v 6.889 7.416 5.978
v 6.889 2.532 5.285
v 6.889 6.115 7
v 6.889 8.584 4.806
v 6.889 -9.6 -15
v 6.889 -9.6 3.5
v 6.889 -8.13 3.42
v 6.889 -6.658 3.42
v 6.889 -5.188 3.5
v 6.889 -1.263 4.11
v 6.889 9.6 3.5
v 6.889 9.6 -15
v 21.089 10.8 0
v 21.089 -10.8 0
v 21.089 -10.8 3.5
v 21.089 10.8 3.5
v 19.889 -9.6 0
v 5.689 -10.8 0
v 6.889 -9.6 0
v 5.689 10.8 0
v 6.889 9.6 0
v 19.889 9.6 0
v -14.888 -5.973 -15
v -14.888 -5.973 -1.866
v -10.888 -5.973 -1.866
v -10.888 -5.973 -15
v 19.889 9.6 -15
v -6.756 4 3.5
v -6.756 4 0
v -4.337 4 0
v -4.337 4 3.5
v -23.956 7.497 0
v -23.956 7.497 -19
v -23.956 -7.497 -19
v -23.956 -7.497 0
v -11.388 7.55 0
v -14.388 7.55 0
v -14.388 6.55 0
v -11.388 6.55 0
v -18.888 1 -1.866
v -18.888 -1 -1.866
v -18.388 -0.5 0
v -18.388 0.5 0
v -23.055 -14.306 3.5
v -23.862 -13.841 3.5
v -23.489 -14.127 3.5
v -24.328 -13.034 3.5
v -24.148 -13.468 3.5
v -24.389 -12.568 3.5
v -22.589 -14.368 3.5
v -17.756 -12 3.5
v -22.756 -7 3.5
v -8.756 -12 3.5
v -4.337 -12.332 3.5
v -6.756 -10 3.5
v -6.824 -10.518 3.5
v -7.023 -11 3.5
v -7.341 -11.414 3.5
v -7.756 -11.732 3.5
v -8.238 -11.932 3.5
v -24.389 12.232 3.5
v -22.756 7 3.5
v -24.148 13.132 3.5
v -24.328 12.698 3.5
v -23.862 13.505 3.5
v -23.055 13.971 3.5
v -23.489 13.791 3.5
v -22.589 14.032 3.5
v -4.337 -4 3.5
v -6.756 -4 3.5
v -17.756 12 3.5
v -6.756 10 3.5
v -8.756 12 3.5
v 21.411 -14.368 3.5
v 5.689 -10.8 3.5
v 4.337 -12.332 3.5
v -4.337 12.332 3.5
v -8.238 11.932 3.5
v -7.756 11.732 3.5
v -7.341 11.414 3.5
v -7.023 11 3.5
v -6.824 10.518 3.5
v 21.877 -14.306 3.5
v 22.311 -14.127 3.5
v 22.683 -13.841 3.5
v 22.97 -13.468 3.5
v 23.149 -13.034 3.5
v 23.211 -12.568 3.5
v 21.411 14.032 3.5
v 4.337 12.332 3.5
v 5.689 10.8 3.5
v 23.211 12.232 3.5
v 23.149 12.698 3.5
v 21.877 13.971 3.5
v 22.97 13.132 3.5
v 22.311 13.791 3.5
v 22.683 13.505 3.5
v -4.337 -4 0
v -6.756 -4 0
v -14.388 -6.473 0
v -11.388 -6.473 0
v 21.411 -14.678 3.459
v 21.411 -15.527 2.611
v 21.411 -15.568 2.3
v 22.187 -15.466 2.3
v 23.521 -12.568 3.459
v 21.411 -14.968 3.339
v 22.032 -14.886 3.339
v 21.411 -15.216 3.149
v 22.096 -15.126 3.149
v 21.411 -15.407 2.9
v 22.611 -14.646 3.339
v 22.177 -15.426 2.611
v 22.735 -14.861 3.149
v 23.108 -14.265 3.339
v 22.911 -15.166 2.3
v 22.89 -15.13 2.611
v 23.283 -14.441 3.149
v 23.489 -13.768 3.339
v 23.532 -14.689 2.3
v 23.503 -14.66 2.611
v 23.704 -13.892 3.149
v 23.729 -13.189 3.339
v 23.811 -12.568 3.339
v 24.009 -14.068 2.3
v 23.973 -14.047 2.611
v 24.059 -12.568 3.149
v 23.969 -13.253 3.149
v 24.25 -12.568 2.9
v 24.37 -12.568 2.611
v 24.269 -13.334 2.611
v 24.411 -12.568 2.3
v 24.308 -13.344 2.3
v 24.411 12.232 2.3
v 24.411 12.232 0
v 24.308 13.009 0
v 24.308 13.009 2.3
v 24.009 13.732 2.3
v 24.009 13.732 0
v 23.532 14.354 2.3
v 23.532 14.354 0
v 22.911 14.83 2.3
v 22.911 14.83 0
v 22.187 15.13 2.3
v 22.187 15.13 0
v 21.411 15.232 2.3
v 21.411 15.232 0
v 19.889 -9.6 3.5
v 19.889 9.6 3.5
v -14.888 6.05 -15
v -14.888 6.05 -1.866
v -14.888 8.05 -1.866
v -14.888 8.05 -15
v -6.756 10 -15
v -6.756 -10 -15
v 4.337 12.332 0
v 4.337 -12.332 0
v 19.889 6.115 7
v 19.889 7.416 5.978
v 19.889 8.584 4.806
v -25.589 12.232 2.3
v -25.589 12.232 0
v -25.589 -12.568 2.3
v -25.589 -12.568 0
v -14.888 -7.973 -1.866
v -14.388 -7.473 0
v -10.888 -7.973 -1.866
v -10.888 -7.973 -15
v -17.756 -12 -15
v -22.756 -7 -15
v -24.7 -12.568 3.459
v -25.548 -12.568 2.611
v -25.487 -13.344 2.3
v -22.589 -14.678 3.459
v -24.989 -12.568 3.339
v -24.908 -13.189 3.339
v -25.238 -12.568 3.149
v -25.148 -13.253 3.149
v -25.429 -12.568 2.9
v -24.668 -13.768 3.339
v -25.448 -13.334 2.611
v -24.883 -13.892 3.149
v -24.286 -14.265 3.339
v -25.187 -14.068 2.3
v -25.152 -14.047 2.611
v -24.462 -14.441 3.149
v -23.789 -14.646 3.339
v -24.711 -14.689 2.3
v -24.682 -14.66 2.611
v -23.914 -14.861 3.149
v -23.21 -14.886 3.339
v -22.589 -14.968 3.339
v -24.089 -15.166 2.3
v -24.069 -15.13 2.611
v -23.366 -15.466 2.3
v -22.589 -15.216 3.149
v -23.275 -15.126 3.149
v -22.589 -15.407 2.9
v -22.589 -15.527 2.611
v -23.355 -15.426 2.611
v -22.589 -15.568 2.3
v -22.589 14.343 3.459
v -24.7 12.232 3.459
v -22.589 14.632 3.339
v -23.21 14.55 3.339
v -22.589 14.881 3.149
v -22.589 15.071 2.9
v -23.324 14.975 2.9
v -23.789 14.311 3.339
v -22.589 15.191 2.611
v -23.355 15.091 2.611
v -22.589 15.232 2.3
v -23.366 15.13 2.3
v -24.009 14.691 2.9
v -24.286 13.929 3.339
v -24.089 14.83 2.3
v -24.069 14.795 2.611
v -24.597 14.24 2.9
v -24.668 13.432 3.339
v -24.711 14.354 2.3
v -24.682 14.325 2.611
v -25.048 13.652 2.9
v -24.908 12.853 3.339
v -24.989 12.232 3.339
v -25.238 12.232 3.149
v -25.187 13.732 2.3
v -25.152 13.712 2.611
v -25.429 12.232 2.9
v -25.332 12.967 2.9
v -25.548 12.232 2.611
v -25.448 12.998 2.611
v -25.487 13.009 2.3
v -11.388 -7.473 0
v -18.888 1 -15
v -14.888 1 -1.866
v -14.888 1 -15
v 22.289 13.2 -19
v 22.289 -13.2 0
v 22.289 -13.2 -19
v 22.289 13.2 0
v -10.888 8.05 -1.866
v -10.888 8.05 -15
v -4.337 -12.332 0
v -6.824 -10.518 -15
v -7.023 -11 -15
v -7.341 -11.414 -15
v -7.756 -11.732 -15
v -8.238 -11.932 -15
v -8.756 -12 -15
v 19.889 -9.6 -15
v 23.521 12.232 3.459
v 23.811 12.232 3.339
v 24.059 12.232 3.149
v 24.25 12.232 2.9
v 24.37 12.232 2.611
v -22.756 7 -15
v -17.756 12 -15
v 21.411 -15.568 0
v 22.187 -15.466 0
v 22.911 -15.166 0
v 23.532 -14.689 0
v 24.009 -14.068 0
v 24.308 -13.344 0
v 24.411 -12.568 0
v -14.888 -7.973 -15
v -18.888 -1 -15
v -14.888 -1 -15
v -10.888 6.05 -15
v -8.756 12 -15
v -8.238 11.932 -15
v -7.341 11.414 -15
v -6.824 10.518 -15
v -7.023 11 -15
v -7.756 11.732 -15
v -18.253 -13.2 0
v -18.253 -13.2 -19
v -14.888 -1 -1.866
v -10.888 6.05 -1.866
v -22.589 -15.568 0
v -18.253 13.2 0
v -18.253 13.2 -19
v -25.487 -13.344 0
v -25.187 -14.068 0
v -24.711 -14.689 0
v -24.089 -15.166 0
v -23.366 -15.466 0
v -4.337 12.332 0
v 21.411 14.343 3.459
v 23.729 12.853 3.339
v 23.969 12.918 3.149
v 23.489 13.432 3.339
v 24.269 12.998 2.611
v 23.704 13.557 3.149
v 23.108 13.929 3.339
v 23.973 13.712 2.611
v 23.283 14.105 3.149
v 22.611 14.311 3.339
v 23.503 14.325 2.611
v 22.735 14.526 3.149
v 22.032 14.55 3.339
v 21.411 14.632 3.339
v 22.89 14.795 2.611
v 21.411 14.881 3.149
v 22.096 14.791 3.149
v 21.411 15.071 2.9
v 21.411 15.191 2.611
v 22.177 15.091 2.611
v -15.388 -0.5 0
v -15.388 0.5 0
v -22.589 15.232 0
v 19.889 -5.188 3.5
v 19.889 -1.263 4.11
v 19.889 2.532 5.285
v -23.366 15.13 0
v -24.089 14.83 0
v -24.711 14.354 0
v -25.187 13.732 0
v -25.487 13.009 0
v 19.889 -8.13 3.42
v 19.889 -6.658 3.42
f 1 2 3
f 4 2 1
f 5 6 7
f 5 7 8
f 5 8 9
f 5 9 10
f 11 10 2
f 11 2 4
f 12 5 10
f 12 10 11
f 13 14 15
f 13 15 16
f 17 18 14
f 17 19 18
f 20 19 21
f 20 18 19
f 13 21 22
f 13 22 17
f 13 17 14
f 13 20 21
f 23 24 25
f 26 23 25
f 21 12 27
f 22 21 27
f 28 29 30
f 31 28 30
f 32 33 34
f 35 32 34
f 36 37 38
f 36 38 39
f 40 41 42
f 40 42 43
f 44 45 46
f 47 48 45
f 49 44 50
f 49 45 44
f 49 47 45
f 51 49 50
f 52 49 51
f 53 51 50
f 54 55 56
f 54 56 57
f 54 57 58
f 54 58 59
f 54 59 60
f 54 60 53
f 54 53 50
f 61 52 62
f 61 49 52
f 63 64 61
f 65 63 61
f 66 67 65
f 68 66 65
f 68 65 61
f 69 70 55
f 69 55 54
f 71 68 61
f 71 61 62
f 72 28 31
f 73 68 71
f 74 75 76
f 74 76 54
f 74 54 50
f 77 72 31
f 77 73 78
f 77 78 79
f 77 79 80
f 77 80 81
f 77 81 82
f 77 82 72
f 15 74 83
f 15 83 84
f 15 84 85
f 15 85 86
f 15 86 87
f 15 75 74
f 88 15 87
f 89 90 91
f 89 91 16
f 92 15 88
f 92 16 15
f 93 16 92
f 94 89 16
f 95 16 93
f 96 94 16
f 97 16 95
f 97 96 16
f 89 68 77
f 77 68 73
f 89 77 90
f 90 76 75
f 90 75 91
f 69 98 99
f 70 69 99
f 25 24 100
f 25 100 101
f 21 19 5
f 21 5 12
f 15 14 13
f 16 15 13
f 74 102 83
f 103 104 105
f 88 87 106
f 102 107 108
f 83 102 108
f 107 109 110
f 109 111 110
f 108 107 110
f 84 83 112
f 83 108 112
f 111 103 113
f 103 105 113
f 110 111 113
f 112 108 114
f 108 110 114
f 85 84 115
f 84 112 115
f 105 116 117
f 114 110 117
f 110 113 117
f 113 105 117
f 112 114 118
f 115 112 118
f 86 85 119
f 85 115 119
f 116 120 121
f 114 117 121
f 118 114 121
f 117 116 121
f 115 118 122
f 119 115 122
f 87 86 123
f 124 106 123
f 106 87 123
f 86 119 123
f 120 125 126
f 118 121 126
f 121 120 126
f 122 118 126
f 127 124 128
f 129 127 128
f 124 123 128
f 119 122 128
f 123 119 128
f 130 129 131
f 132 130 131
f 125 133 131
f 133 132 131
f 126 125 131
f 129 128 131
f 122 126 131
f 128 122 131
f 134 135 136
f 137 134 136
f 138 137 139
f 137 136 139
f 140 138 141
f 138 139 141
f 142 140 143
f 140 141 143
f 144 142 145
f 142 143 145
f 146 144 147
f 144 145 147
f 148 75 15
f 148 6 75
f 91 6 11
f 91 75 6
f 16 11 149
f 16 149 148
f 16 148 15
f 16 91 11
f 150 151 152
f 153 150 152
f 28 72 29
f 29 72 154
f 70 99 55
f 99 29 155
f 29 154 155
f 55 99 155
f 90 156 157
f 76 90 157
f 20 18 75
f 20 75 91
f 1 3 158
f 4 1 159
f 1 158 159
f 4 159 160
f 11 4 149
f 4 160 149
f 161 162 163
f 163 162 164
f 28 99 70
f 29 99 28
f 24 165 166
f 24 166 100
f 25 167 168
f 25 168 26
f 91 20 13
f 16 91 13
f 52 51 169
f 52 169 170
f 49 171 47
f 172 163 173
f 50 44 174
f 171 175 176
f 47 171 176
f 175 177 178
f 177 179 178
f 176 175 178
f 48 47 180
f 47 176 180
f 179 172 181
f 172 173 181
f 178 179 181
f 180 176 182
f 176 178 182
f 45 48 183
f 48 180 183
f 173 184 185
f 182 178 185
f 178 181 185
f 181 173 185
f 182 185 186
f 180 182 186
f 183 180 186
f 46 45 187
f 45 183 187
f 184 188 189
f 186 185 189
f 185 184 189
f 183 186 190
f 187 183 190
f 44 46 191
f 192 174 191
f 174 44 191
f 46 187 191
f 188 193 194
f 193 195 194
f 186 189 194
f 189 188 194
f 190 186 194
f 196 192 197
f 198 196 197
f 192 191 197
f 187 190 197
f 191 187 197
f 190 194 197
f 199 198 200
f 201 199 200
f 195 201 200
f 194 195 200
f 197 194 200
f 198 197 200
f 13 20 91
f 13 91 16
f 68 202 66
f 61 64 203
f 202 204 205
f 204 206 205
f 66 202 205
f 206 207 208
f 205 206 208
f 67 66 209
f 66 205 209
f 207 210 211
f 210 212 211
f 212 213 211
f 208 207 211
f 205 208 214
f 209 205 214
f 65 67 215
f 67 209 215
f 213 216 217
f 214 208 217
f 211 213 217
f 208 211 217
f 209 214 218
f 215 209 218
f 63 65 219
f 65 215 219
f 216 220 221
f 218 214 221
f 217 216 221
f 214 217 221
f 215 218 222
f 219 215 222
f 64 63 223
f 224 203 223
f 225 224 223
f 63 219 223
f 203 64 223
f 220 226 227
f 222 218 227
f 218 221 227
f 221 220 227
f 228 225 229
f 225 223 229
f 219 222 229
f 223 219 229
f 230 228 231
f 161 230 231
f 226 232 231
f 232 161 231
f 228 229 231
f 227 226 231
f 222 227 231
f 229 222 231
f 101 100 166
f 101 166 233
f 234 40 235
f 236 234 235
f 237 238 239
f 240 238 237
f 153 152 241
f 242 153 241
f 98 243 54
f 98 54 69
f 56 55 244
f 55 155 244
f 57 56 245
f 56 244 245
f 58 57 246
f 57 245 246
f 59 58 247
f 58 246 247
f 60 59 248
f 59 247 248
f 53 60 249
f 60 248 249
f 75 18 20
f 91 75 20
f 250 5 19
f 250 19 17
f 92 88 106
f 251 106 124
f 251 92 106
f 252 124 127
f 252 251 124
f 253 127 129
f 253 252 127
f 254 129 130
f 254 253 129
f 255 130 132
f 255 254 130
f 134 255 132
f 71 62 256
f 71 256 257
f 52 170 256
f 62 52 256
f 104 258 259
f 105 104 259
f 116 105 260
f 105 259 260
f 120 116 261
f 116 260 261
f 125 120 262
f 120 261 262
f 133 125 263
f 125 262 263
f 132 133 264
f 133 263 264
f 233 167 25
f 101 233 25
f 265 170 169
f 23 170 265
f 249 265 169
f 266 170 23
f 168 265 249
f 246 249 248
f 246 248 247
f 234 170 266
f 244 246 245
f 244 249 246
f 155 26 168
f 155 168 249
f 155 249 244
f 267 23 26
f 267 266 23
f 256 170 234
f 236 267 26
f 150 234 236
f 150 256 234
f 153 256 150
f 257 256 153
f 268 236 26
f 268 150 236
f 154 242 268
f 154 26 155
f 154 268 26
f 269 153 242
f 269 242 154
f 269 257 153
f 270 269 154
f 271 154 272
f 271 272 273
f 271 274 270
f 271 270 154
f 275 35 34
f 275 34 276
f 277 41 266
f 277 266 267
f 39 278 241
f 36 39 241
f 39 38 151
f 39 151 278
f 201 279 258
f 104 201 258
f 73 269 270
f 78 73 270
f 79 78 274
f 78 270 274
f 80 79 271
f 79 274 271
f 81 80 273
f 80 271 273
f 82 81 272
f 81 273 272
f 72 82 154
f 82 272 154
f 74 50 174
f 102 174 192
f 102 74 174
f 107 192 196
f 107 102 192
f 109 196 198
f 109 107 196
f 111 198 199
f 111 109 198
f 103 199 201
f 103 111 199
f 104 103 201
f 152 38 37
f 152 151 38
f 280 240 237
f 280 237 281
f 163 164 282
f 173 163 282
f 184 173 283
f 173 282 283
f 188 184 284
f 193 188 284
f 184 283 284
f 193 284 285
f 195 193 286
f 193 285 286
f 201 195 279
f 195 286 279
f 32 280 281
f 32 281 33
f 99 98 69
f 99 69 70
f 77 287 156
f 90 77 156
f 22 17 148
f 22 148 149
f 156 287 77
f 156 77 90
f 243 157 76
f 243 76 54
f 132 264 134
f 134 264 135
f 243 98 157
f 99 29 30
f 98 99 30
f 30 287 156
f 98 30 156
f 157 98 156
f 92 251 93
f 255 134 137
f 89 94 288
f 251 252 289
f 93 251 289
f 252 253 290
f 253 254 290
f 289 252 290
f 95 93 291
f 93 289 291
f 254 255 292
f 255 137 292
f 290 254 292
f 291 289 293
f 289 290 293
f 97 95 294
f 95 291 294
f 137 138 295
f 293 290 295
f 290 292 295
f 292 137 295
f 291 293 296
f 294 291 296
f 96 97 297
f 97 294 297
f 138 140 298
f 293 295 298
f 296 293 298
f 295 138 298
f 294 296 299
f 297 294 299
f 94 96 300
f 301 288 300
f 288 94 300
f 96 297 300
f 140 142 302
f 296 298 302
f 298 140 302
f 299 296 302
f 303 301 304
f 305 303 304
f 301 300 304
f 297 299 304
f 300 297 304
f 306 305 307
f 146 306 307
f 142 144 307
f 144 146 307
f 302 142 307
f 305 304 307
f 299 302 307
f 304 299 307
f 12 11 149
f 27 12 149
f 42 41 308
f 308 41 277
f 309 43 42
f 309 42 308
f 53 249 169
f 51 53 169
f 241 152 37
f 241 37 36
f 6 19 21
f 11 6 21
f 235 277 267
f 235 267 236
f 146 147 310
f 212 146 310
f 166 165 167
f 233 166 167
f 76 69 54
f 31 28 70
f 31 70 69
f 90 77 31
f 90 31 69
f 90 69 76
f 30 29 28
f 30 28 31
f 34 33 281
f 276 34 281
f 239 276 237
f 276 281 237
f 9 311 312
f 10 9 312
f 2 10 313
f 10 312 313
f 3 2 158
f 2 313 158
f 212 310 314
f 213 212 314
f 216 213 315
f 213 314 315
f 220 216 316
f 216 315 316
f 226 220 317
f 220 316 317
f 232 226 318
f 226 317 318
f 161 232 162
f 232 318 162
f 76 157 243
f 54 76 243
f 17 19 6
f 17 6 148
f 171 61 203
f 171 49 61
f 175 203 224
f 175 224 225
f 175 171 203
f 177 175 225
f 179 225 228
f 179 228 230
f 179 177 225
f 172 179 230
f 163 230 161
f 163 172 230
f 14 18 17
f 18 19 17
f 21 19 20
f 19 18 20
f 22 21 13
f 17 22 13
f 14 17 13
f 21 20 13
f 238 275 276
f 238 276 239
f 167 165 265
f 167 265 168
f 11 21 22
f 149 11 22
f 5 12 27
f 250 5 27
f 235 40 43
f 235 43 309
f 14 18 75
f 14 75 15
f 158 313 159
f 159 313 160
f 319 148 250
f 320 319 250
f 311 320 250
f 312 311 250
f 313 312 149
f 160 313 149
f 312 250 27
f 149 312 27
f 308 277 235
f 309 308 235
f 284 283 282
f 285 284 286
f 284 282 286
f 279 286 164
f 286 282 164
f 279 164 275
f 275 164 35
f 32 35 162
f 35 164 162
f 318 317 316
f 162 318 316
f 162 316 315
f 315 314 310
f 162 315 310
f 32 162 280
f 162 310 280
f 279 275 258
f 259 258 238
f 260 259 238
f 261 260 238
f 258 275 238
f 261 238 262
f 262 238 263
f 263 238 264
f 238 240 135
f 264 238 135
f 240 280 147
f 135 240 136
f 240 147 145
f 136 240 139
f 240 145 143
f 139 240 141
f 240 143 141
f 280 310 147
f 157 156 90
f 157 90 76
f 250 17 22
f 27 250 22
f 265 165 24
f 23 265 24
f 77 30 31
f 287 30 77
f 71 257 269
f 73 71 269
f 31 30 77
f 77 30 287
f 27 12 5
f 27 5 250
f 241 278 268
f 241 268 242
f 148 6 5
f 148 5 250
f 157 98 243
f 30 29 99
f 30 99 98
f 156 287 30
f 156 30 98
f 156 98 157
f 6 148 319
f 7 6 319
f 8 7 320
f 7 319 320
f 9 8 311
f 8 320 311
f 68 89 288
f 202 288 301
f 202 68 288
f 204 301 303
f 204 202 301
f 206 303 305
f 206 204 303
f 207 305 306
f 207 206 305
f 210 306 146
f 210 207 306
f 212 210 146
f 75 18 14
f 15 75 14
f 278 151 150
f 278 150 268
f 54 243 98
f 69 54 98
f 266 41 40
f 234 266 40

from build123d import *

# Parameters (mm, degrees)
F0_W        = 15.4
F0_H        = 21.6
F1_DEPTH    = 3.5
F0_W_2      = 4
F0_H_2      = 2
F0_W_3      = 13
F0_H_3      = 19.2
F0_W_4      = 2.418700546
F0_H_4      = 8
F2_DEPTH    = 19
F3_DEPTH    = 15
F4_C1_SIZE2 = 0.5
F4_C1_SIZE  = 1.8660254038
F4_C2_SIZE2 = 0.5
F4_C2_SIZE  = 1.8660254038
F4_C3_SIZE2 = 1.8660254038
F4_C3_SIZE  = 0.5
F4_C4_SIZE2 = 1.8660254038
F4_C4_SIZE  = 0.5
F5_SIZE2    = 1.8660254038
F5_SIZE     = 0.5
F6_SIZE2    = 1.8660254038
F6_SIZE     = 0.5
F7_DEPTH    = 3.5
F8_DEPTH    = 22
F10_DEPTH   = 25
F11_R       = 1.2


with BuildPart() as f1:
    # F0 (on Top) → F1 (new body)
    with BuildSketch(Plane.XY):
        with BuildLine():
            Line((21.4106866419, 15.232257545), (-22.5893133581, 15.232257545))
            ThreePointArc((-22.5893133581, 15.232257545), (-24.7106337016, 14.3535778886), (-25.5893133581, 12.232257545))
            Line((-25.5893133581, 12.232257545), (-25.5893133581, -12.567742455))
            ThreePointArc((-25.5893133581, -12.567742455), (-24.7106337016, -14.6890627986), (-22.5893133581, -15.567742455))
            Line((-22.5893133581, -15.567742455), (21.4106866419, -15.567742455))
            ThreePointArc((21.4106866419, -15.567742455), (23.5320069855, -14.6890627986), (24.4106866419, -12.567742455))
            Line((24.4106866419, -12.567742455), (24.4106866419, 12.232257545))
            ThreePointArc((24.4106866419, 12.232257545), (23.5320069855, 14.3535778886), (21.4106866419, 15.232257545))
        make_face()
        Polygon((-18.2525572471, 13.2), (-8.7555009723, 13.2), (22.2888856925, 13.2), (22.2888856925, -13.2), (-8.7555009723, -13.2), (-18.2525572471, -13.2), (-23.9555009723, -7.4970562748), (-23.9555009723, 7.4970562748), align=None, mode=Mode.SUBTRACT)
        Polygon((22.2888856925, 13.2), (-8.7555009723, 13.2), (-18.2525572471, 13.2), (-23.9555009723, 7.4970562748), (-23.9555009723, -7.4970562748), (-18.2525572471, -13.2), (-8.7555009723, -13.2), (22.2888856925, -13.2), align=None)
        with BuildLine():
            Line((-4.3368004262, 4), (-4.3368004262, 12.3322419822))
            Line((-4.3368004262, 12.3322419822), (4.3368004262, 12.3322419822))
            Line((4.3368004262, 12.3322419822), (4.3368004262, -12.3322419822))
            Line((4.3368004262, -12.3322419822), (-4.3368004262, -12.3322419822))
            Line((-4.3368004262, -12.3322419822), (-4.3368004262, -4))
            Line((-4.3368004262, -4), (-6.7555009723, -4))
            Line((-6.7555009723, -4), (-6.7555009723, -10))
            ThreePointArc((-6.7555009723, -10), (-7.3412874099, -11.4142135624), (-8.7555009723, -12))
            Line((-8.7555009723, -12), (-17.7555009723, -12))
            Line((-17.7555009723, -12), (-22.7555009723, -7))
            Line((-22.7555009723, -7), (-22.7555009723, 7))
            Line((-22.7555009723, 7), (-17.7555009723, 12))
            Line((-17.7555009723, 12), (-8.7555009723, 12))
            ThreePointArc((-8.7555009723, 12), (-7.3412874099, 11.4142135624), (-6.7555009723, 10))
            Line((-6.7555009723, 10), (-6.7555009723, 4))
            Line((-6.7555009723, 4), (-4.3368004262, 4))
        make_face(mode=Mode.SUBTRACT)
        with Locations((13.3888856925, 0)):
            Rectangle(F0_W, F0_H, mode=Mode.SUBTRACT)
    extrude(amount=F1_DEPTH)

    # F0 (on Top) → F2 (join)
    with BuildSketch(Plane.XY):
        Polygon((22.2888856925, 13.2), (-8.7555009723, 13.2), (-18.2525572471, 13.2), (-23.9555009723, 7.4970562748), (-23.9555009723, -7.4970562748), (-18.2525572471, -13.2), (-8.7555009723, -13.2), (22.2888856925, -13.2), align=None)
        with BuildLine():
            Line((-4.3368004262, 4), (-4.3368004262, 12.3322419822))
            Line((-4.3368004262, 12.3322419822), (4.3368004262, 12.3322419822))
            Line((4.3368004262, 12.3322419822), (4.3368004262, -12.3322419822))
            Line((4.3368004262, -12.3322419822), (-4.3368004262, -12.3322419822))
            Line((-4.3368004262, -12.3322419822), (-4.3368004262, -4))
            Line((-4.3368004262, -4), (-6.7555009723, -4))
            Line((-6.7555009723, -4), (-6.7555009723, -10))
            ThreePointArc((-6.7555009723, -10), (-7.3412874099, -11.4142135624), (-8.7555009723, -12))
            Line((-8.7555009723, -12), (-17.7555009723, -12))
            Line((-17.7555009723, -12), (-22.7555009723, -7))
            Line((-22.7555009723, -7), (-22.7555009723, 7))
            Line((-22.7555009723, 7), (-17.7555009723, 12))
            Line((-17.7555009723, 12), (-8.7555009723, 12))
            ThreePointArc((-8.7555009723, 12), (-7.3412874099, 11.4142135624), (-6.7555009723, 10))
            Line((-6.7555009723, 10), (-6.7555009723, 4))
            Line((-6.7555009723, 4), (-4.3368004262, 4))
        make_face(mode=Mode.SUBTRACT)
        with Locations((13.3888856925, 0)):
            Rectangle(F0_W, F0_H, mode=Mode.SUBTRACT)
        with BuildLine():
            Line((-6.7555009723, -4), (-6.7555009723, 4))
            Line((-6.7555009723, 4), (-6.7555009723, 10))
            ThreePointArc((-6.7555009723, 10), (-7.3412874099, 11.4142135624), (-8.7555009723, 12))
            Line((-8.7555009723, 12), (-17.7555009723, 12))
            Line((-17.7555009723, 12), (-22.7555009723, 7))
            Line((-22.7555009723, 7), (-22.7555009723, -7))
            Line((-22.7555009723, -7), (-17.7555009723, -12))
            Line((-17.7555009723, -12), (-8.7555009723, -12))
            ThreePointArc((-8.7555009723, -12), (-7.3412874099, -11.4142135624), (-6.7555009723, -10))
            Line((-6.7555009723, -10), (-6.7555009723, -4))
        make_face()
        with Locations((-12.8875139207, -6.9733052514)):
            Rectangle(F0_W_2, F0_H_2, mode=Mode.SUBTRACT)
        with Locations((-16.8875139207, 0)):
            Rectangle(F0_W_2, F0_H_2, mode=Mode.SUBTRACT)
        with Locations((-12.8875139207, 7.0500936662)):
            Rectangle(F0_W_2, F0_H_2, mode=Mode.SUBTRACT)
        with Locations((13.3888856925, 0)):
            Rectangle(F0_W, F0_H)
        with Locations((13.3888856925, 0)):
            Rectangle(F0_W_3, F0_H_3, mode=Mode.SUBTRACT)
        with Locations((13.3888856925, 0)):
            Rectangle(F0_W_3, F0_H_3)
        Polygon((4.3368004262, 12.3322419822), (-4.3368004262, 12.3322419822), (-4.3368004262, 4), (-4.3368004262, -4), (-4.3368004262, -12.3322419822), (4.3368004262, -12.3322419822), align=None)
        with Locations((-5.5461506993, 0)):
            Rectangle(F0_W_4, F0_H_4)
        with Locations((-12.8875139207, -6.9733052514)):
            Rectangle(F0_W_2, F0_H_2)
        with Locations((-16.8875139207, 0)):
            Rectangle(F0_W_2, F0_H_2)
        with Locations((-12.8875139207, 7.0500936662)):
            Rectangle(F0_W_2, F0_H_2)
    extrude(amount=-F2_DEPTH)

    # F0 (on Top) → F3 (cut)
    with BuildSketch(Plane.XY):
        with BuildLine():
            Line((-6.7555009723, -4), (-6.7555009723, 4))
            Line((-6.7555009723, 4), (-6.7555009723, 10))
            ThreePointArc((-6.7555009723, 10), (-7.3412874099, 11.4142135624), (-8.7555009723, 12))
            Line((-8.7555009723, 12), (-17.7555009723, 12))
            Line((-17.7555009723, 12), (-22.7555009723, 7))
            Line((-22.7555009723, 7), (-22.7555009723, -7))
            Line((-22.7555009723, -7), (-17.7555009723, -12))
            Line((-17.7555009723, -12), (-8.7555009723, -12))
            ThreePointArc((-8.7555009723, -12), (-7.3412874099, -11.4142135624), (-6.7555009723, -10))
            Line((-6.7555009723, -10), (-6.7555009723, -4))
        make_face()
        with Locations((-12.8875139207, -6.9733052514)):
            Rectangle(F0_W_2, F0_H_2, mode=Mode.SUBTRACT)
        with Locations((-16.8875139207, 0)):
            Rectangle(F0_W_2, F0_H_2, mode=Mode.SUBTRACT)
        with Locations((-12.8875139207, 7.0500936662)):
            Rectangle(F0_W_2, F0_H_2, mode=Mode.SUBTRACT)
        with Locations((13.3888856925, 0)):
            Rectangle(F0_W_3, F0_H_3)
    extrude(amount=-F3_DEPTH, mode=Mode.SUBTRACT)

    # F4: chamfer of 0.5 x 1.8660254038 on 4 edges, made by hand

    # F4_c1
    f4_c1_edges = [f1.edges().sort_by_distance(p)[0] for p in [
        (-10.8875139207, 7.0500936662, 0),
    ]]
    f4_c1_side = f1.faces().sort_by_distance((-10.8875139207, 7.0500936662, -0.01))[0]
    chamfer(f4_c1_edges, length=F4_C1_SIZE, length2=F4_C1_SIZE2, reference=f4_c1_side)

    # F4_c2
    f4_c2_edges = [f1.edges().sort_by_distance(p)[0] for p in [
        (-13.1375139207, 6.0500936662, 0),
    ]]
    f4_c2_side = f1.faces().sort_by_distance((-13.1375139207, 6.0500936662, -0.01))[0]
    chamfer(f4_c2_edges, length=F4_C2_SIZE, length2=F4_C2_SIZE2, reference=f4_c2_side)

    # F4_c3
    f4_c3_edges = [f1.edges().sort_by_distance(p)[0] for p in [
        (-14.8875139207, 7.3000936662, 0),
    ]]
    f4_c3_side = f1.faces().sort_by_distance((-14.8775139207, 7.3000936662, 0))[0]
    chamfer(f4_c3_edges, length=F4_C3_SIZE, length2=F4_C3_SIZE2, reference=f4_c3_side)

    # F4_c4
    f4_c4_edges = [f1.edges().sort_by_distance(p)[0] for p in [
        (-12.8875139207, 8.0500936662, 0),
    ]]
    f4_c4_side = f1.faces().sort_by_distance((-12.8875139207, 8.0400936662, 0))[0]
    chamfer(f4_c4_edges, length=F4_C4_SIZE, length2=F4_C4_SIZE2, reference=f4_c4_side)

    # F5
    f5_edges = [f1.edges().sort_by_distance(p)[0] for p in [
        (-16.887514, 1, 0),
        (-14.887514, 0, 0),
        (-16.887514, -1, 0),
        (-18.887514, 0, 0),
    ]]
    f5_side = f1.faces().sort_by_distance((-16.887514, 0, 0))[0]
    chamfer(f5_edges, length=F5_SIZE, length2=F5_SIZE2, reference=f5_side)

    # F6
    f6_edges = [f1.edges().sort_by_distance(p)[0] for p in [
        (-14.887514, -6.973305, 0),
        (-12.887514, -5.973305, 0),
        (-10.887514, -6.973305, 0),
        (-12.887514, -7.973305, 0),
    ]]
    f6_side = f1.faces().sort_by_distance((-12.887514, -6.973305, 0))[0]
    chamfer(f6_edges, length=F6_SIZE, length2=F6_SIZE2, reference=f6_side)


with BuildPart() as f7:
    # F7 (new, through all): a face of the model
    f7_faces = [f1.part.faces().sort_by_distance(p)[0] for p in [
        (-0.4600310991, 0, 0),
    ]]
    extrude(f7_faces, amount=F7_DEPTH)


with BuildPart() as f7b:
    # F7#2 (new, through all): a face of the model
    f7_2_faces = [f1.part.faces().sort_by_distance(p)[0] for p in [
        (13.3888856925, -10.5347227865, 0),
    ]]
    extrude(f7_2_faces, amount=F7_DEPTH)


with BuildPart() as f8:
    # F8 (new): a face of the model
    f8_faces = [f1.part.faces().sort_by_distance(p)[0] for p in [
        (13.3888856925, 0, -15),
    ]]
    extrude(f8_faces, amount=F8_DEPTH)

    # F9 (on face) → F10 (cut)
    with BuildSketch(Plane.YZ.offset(19.8888856925)):
        with BuildLine():
            ThreePointArc((-9.6, 3.5), (-7.3938840069, 3.410434439), (-5.1877680138, 3.5))
            Line((-5.1877680138, 3.5), (-9.6, 3.5))
        make_face()
        with BuildLine():
            Line((-9.6, 3.5), (-5.1877680138, 3.5))
            ThreePointArc((-5.1877680138, 3.5), (0.6561669902, 4.6282852574), (6.1150655176, 7))
            Line((6.1150655176, 7), (-9.6, 7))
            Line((-9.6, 7), (-9.6, 3.5))
        make_face()
        with BuildLine():
            ThreePointArc((6.1150655176, 7), (8.0179372576, 5.4097140483), (9.6, 3.5))
            Line((9.6, 3.5), (9.6, 7))
            Line((9.6, 7), (6.1150655176, 7))
        make_face()
    extrude(amount=-F10_DEPTH, mode=Mode.SUBTRACT)


with BuildPart() as f1_1:
    add(f1.part)

    # F11
    f11_edges = [f1_1.edges().sort_by_distance(p)[0] for p in [
        (-25.589313, -0.167742, 3.5),
        (24.410687, -0.167742, 3.5),
        (23.532007, 14.353578, 3.5),
        (-0.589313, 15.232258, 3.5),
        (-24.710634, 14.353578, 3.5),
        (-24.710634, -14.689063, 3.5),
        (-0.589313, -15.567742, 3.5),
        (23.532007, -14.689063, 3.5),
    ]]
    fillet(f11_edges, radius=F11_R)


solid = Compound([f7.part, f7b.part, f8.part, f1_1.part])
